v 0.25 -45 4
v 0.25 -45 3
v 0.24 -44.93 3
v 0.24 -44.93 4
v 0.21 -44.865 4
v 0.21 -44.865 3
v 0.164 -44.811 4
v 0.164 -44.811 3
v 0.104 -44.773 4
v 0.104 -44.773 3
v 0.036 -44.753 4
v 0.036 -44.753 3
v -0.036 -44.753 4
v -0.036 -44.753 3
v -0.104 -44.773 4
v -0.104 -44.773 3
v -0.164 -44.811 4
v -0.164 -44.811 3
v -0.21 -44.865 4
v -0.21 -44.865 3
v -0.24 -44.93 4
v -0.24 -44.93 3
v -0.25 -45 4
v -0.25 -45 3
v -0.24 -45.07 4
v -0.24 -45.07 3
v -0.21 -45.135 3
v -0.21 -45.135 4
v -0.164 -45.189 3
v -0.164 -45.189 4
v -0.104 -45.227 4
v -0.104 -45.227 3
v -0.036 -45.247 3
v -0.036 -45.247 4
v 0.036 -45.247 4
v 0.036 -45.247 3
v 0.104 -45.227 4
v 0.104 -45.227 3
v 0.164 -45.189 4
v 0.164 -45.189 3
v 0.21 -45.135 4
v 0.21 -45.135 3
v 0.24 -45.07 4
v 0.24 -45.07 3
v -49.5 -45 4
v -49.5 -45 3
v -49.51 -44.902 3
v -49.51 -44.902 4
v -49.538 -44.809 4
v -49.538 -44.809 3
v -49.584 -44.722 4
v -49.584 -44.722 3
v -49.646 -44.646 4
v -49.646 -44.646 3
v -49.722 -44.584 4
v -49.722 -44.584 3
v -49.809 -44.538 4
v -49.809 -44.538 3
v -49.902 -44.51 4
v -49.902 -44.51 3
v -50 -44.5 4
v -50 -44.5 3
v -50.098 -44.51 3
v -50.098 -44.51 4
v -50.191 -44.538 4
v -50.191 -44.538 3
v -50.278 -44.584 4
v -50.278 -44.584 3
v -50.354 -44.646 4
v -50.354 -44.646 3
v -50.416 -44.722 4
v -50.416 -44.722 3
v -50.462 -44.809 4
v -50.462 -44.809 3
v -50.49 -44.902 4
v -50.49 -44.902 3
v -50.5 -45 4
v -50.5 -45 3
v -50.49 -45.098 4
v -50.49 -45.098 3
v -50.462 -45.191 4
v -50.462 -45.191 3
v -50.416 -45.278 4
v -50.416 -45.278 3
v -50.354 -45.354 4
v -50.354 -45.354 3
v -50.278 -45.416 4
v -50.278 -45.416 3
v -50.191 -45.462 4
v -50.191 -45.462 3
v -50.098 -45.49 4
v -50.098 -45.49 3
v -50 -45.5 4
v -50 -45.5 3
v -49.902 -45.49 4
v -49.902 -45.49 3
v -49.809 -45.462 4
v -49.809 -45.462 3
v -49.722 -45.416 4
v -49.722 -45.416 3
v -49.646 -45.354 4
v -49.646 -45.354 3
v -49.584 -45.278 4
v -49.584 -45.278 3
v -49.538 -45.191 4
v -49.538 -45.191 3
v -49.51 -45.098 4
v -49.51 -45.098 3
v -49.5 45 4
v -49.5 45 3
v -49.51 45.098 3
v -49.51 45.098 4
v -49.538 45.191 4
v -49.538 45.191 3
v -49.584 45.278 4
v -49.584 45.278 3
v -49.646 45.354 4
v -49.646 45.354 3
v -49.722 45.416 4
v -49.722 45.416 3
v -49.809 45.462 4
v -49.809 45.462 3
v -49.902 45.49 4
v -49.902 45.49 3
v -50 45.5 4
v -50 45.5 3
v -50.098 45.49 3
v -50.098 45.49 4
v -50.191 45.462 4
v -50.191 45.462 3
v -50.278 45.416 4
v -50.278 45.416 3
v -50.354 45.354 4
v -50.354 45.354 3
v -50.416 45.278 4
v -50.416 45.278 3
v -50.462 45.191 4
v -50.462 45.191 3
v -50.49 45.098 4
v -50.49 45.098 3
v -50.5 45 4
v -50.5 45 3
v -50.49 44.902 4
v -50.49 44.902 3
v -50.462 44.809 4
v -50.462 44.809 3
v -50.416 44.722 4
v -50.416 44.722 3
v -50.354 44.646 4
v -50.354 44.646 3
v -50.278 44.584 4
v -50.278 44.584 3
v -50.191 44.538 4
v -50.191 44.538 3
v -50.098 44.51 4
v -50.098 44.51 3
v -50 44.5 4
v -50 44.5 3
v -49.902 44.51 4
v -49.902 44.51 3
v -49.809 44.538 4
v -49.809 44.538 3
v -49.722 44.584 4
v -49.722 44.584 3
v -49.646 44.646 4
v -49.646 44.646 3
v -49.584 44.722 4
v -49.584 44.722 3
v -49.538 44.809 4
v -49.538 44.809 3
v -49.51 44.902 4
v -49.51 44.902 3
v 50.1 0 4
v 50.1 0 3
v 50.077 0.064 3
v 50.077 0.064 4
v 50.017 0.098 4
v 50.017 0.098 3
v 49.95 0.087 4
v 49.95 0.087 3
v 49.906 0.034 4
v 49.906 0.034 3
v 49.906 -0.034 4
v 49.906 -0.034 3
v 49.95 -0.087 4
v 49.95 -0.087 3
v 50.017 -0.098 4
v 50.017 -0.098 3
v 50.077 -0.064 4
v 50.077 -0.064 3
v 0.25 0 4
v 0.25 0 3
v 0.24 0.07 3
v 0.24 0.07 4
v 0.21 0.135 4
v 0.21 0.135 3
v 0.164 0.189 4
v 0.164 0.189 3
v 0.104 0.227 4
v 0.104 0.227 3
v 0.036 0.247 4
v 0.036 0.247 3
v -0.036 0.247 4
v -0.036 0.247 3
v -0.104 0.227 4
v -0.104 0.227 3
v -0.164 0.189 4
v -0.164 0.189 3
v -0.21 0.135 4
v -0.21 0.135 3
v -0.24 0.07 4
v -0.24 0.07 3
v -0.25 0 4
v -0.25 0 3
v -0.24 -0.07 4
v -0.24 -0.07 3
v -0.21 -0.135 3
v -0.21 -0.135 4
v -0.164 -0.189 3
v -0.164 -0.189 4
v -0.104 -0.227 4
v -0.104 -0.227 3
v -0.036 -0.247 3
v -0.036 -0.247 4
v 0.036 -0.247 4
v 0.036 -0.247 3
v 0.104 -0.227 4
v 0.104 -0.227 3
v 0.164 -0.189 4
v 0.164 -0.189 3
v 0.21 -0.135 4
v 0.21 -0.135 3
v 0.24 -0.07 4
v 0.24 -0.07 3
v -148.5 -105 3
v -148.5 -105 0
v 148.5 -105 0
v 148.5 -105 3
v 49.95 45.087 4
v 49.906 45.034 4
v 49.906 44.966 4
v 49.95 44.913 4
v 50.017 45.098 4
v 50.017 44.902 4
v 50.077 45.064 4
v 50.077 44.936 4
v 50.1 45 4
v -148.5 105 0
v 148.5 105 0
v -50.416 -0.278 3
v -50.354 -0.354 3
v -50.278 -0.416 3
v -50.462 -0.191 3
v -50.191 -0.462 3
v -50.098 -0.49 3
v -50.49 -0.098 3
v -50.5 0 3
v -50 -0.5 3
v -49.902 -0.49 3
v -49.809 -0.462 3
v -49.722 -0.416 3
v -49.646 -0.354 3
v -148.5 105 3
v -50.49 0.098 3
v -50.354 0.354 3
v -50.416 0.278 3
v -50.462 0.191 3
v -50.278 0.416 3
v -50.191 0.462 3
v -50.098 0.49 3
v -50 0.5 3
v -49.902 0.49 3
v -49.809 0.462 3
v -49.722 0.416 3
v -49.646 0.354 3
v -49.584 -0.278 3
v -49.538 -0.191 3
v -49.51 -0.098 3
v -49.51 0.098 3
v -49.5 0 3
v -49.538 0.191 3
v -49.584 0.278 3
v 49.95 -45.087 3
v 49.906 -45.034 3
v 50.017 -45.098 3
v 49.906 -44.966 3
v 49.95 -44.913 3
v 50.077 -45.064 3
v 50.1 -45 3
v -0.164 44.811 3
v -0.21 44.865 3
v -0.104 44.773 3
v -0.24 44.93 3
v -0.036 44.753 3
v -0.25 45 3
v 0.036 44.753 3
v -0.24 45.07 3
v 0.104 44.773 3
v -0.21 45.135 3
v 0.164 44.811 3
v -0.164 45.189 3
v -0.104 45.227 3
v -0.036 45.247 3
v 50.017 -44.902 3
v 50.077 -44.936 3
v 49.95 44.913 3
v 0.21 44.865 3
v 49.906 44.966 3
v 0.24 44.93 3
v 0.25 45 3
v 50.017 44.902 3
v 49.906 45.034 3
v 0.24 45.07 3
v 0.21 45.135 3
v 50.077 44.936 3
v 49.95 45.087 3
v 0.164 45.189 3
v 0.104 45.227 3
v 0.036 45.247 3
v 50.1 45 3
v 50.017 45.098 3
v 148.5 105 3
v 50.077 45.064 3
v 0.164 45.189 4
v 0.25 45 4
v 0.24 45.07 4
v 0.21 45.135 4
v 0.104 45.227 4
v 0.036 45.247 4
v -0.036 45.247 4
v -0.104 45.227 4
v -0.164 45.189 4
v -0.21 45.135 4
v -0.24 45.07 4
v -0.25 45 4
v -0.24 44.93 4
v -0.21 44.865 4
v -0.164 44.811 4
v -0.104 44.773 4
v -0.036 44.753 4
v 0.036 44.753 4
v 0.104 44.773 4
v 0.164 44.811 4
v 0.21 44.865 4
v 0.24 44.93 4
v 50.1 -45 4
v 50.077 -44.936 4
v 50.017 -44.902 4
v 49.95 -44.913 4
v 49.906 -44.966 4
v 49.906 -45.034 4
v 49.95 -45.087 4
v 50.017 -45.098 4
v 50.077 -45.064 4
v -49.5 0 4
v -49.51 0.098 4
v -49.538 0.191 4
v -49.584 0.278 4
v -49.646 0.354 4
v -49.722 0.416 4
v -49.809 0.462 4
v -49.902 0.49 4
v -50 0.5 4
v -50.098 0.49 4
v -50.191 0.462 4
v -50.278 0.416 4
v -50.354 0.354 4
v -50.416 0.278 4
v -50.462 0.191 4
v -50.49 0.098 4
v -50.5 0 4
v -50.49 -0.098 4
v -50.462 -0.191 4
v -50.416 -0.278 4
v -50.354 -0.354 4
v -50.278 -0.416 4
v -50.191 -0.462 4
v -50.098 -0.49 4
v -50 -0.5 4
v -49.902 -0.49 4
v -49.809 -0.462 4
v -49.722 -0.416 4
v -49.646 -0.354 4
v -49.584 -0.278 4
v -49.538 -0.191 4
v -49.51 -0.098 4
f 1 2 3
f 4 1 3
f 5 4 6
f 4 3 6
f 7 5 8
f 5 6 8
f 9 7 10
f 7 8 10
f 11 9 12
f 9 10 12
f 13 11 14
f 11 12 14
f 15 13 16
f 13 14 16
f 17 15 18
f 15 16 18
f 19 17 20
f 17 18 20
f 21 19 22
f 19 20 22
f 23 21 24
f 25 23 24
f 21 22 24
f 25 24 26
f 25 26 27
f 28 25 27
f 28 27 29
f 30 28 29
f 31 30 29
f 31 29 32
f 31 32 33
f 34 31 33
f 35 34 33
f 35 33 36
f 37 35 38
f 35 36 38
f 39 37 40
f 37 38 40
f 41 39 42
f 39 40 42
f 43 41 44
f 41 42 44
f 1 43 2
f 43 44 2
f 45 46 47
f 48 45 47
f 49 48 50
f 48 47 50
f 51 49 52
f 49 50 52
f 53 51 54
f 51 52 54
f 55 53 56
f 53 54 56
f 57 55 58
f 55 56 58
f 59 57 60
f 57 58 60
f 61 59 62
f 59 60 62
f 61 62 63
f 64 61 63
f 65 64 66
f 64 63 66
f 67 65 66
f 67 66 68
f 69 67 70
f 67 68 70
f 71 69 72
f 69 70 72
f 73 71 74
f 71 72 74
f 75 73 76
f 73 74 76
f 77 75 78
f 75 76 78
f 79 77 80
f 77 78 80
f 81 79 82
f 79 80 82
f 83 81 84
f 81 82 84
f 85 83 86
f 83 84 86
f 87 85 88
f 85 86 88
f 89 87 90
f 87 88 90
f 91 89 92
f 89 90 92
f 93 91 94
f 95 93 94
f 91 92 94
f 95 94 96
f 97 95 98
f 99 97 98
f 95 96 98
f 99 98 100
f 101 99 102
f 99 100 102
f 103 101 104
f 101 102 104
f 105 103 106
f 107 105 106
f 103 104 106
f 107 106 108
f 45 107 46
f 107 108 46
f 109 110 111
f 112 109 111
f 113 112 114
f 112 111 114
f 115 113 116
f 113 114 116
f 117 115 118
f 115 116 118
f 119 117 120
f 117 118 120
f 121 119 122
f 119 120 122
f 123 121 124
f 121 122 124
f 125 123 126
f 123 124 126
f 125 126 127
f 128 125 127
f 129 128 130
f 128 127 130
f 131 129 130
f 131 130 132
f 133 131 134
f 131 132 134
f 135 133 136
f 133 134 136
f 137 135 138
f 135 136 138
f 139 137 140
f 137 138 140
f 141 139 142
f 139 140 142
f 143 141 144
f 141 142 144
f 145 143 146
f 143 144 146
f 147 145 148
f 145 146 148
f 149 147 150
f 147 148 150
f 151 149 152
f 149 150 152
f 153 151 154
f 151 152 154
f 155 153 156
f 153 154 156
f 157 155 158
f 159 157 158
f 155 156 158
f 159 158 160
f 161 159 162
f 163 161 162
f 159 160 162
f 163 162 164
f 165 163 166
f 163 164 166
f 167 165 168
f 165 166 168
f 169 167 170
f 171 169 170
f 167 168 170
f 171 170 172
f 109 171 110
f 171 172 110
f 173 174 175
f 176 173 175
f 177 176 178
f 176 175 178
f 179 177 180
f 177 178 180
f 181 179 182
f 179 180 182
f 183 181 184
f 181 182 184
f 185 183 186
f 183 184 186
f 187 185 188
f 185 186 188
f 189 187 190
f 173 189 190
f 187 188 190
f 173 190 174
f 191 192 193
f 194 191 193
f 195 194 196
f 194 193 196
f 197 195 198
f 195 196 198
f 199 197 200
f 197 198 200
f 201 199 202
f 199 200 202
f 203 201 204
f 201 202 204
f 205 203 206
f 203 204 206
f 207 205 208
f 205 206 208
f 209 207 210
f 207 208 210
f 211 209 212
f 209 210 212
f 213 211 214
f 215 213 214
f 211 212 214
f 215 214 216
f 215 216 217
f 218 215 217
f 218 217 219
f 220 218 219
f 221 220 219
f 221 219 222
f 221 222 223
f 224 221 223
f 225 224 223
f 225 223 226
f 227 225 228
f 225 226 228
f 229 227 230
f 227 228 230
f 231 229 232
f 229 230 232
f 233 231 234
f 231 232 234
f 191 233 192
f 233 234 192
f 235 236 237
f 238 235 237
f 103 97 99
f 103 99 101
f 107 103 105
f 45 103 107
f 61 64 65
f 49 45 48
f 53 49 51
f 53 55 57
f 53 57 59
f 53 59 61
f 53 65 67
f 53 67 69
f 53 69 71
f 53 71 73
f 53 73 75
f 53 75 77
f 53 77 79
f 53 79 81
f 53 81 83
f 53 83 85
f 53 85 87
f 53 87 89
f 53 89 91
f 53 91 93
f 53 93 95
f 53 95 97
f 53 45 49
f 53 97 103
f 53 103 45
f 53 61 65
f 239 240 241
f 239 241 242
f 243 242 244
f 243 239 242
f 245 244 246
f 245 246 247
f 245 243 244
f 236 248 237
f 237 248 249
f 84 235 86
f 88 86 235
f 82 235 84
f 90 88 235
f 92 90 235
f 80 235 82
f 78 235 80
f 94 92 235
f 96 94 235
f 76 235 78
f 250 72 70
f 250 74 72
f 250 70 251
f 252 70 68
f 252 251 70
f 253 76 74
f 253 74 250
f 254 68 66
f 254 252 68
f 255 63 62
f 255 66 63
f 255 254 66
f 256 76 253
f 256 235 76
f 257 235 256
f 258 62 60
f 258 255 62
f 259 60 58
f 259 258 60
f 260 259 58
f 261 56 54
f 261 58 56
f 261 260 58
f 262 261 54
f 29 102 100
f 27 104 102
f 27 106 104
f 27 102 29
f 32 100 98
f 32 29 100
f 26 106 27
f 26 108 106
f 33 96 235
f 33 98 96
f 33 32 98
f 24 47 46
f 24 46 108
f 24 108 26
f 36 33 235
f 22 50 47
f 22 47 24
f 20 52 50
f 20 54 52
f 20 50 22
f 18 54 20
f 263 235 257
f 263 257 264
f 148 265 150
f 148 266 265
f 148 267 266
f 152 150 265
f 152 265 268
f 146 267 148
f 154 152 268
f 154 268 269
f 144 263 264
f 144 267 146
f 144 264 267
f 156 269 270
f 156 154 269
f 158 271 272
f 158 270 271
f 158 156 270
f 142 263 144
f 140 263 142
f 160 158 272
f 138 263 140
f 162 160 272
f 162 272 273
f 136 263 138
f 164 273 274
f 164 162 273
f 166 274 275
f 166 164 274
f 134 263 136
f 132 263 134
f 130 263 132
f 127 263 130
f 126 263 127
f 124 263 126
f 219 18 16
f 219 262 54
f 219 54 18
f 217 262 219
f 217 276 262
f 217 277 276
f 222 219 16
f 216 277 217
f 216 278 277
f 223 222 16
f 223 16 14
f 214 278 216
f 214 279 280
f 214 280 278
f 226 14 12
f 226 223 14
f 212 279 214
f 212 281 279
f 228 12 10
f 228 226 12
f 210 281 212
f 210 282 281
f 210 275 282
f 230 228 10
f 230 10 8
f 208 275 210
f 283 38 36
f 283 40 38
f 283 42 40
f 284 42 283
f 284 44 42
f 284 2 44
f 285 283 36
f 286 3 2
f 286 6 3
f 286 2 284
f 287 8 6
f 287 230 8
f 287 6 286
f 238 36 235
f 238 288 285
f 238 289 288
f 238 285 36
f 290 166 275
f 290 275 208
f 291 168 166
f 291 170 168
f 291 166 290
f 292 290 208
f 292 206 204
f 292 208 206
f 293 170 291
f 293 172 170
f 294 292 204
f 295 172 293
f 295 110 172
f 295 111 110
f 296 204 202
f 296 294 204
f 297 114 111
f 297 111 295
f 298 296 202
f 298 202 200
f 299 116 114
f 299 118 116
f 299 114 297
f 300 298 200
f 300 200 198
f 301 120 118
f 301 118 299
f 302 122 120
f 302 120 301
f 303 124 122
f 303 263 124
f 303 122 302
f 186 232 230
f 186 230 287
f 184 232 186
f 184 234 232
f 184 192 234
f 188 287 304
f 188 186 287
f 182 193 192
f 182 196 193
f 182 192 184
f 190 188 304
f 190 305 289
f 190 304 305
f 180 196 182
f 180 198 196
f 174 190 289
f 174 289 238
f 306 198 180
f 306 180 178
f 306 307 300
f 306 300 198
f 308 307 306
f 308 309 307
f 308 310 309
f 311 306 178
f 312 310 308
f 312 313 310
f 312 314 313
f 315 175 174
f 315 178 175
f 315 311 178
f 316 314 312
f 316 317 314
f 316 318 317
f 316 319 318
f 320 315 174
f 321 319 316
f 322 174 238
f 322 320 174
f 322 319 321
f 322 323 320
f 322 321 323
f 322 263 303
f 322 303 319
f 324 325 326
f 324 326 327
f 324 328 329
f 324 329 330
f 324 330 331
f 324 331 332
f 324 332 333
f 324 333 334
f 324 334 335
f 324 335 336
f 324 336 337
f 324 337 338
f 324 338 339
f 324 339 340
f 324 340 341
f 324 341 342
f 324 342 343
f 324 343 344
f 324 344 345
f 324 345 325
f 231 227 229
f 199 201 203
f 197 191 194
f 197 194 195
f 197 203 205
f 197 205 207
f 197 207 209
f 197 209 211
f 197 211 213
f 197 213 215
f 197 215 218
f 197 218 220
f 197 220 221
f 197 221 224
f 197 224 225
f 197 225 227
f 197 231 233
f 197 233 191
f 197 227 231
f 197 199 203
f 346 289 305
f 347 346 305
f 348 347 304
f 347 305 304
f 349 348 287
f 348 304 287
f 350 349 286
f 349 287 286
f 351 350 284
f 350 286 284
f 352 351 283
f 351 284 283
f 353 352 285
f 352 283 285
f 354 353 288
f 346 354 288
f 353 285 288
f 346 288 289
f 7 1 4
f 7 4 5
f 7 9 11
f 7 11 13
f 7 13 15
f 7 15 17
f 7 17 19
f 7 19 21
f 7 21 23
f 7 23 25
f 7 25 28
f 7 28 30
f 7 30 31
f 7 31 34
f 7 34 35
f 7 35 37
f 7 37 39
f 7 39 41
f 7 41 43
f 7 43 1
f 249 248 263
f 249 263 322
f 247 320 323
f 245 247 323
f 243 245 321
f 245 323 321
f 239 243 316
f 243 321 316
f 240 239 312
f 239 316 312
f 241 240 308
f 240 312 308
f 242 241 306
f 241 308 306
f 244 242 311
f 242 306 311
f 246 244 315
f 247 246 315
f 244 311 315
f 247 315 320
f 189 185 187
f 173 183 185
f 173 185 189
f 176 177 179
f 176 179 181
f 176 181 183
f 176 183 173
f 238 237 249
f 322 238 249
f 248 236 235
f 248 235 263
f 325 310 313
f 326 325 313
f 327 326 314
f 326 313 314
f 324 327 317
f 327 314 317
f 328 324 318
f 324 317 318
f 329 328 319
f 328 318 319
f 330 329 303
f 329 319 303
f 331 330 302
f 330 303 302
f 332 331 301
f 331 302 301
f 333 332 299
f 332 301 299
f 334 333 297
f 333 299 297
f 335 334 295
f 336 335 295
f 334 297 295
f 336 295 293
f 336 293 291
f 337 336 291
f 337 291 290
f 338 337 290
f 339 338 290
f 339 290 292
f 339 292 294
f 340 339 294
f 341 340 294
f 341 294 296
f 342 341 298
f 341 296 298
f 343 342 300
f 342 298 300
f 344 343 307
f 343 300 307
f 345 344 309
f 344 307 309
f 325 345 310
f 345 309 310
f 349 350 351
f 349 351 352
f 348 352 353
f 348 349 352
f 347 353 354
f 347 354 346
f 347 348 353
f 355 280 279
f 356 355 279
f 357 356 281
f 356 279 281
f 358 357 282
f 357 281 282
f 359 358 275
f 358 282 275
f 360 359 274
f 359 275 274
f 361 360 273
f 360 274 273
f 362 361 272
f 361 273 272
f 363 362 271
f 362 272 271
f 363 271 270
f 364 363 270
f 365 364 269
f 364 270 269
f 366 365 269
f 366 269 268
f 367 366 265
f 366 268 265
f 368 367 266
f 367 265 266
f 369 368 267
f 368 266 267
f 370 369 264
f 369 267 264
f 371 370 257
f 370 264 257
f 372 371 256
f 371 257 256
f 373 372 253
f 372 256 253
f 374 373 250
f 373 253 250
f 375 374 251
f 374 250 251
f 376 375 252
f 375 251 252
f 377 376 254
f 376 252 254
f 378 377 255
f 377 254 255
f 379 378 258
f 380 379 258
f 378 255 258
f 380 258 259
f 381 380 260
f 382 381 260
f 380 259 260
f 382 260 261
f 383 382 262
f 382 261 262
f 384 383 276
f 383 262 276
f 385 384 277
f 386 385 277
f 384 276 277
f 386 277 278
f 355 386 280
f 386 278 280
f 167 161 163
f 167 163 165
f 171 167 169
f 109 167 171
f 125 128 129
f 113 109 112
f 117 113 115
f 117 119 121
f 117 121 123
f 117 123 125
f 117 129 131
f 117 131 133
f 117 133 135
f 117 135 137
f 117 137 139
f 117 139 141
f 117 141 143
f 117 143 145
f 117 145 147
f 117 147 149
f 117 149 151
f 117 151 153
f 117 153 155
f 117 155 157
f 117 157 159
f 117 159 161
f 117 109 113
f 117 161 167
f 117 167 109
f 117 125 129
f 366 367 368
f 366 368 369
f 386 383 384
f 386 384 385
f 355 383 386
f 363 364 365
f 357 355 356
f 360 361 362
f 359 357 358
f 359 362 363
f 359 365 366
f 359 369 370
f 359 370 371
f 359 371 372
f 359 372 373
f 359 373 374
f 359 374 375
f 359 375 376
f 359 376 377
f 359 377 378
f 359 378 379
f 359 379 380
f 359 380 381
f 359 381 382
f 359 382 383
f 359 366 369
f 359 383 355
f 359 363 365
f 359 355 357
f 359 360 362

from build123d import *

# Parameters (mm, degrees)
F0_W     = 297
F0_H     = 210
F1_DEPTH = 3
F2_R     = 0.1
F3_DEPTH = 1
F4_R     = 0.25
F5_DEPTH = 1
F6_R     = 0.5
F7_DEPTH = 1


with BuildPart() as f1:
    # F0 (on Top) → F1 (new body)
    with BuildSketch(Plane.XY):
        Rectangle(F0_W, F0_H)
    extrude(amount=F1_DEPTH)

    # F2 (on face) → F3 (join)
    with BuildSketch(Plane.XY.offset(3)):
        with Locations((50, 45)):
            Circle(F2_R)
        with Locations((50, 0)):
            Circle(F2_R)
        with Locations((50, -45)):
            Circle(F2_R)
    extrude(amount=F3_DEPTH)

    # F4 (on face) → F5 (join)
    with BuildSketch(Plane.XY.offset(3)):
        with Locations((0, 45)):
            Circle(F4_R)
        Circle(F4_R)
        with Locations((0, -45)):
            Circle(F4_R)
    extrude(amount=F5_DEPTH)

    # F6 (on face) → F7 (join)
    with BuildSketch(Plane.XY.offset(3)):
        with Locations((-50, 45)):
            Circle(F6_R)
        with Locations((-50, 0)):
            Circle(F6_R)
        with Locations((-50, -45)):
            Circle(F6_R)
    extrude(amount=F7_DEPTH)


solid = f1.part
